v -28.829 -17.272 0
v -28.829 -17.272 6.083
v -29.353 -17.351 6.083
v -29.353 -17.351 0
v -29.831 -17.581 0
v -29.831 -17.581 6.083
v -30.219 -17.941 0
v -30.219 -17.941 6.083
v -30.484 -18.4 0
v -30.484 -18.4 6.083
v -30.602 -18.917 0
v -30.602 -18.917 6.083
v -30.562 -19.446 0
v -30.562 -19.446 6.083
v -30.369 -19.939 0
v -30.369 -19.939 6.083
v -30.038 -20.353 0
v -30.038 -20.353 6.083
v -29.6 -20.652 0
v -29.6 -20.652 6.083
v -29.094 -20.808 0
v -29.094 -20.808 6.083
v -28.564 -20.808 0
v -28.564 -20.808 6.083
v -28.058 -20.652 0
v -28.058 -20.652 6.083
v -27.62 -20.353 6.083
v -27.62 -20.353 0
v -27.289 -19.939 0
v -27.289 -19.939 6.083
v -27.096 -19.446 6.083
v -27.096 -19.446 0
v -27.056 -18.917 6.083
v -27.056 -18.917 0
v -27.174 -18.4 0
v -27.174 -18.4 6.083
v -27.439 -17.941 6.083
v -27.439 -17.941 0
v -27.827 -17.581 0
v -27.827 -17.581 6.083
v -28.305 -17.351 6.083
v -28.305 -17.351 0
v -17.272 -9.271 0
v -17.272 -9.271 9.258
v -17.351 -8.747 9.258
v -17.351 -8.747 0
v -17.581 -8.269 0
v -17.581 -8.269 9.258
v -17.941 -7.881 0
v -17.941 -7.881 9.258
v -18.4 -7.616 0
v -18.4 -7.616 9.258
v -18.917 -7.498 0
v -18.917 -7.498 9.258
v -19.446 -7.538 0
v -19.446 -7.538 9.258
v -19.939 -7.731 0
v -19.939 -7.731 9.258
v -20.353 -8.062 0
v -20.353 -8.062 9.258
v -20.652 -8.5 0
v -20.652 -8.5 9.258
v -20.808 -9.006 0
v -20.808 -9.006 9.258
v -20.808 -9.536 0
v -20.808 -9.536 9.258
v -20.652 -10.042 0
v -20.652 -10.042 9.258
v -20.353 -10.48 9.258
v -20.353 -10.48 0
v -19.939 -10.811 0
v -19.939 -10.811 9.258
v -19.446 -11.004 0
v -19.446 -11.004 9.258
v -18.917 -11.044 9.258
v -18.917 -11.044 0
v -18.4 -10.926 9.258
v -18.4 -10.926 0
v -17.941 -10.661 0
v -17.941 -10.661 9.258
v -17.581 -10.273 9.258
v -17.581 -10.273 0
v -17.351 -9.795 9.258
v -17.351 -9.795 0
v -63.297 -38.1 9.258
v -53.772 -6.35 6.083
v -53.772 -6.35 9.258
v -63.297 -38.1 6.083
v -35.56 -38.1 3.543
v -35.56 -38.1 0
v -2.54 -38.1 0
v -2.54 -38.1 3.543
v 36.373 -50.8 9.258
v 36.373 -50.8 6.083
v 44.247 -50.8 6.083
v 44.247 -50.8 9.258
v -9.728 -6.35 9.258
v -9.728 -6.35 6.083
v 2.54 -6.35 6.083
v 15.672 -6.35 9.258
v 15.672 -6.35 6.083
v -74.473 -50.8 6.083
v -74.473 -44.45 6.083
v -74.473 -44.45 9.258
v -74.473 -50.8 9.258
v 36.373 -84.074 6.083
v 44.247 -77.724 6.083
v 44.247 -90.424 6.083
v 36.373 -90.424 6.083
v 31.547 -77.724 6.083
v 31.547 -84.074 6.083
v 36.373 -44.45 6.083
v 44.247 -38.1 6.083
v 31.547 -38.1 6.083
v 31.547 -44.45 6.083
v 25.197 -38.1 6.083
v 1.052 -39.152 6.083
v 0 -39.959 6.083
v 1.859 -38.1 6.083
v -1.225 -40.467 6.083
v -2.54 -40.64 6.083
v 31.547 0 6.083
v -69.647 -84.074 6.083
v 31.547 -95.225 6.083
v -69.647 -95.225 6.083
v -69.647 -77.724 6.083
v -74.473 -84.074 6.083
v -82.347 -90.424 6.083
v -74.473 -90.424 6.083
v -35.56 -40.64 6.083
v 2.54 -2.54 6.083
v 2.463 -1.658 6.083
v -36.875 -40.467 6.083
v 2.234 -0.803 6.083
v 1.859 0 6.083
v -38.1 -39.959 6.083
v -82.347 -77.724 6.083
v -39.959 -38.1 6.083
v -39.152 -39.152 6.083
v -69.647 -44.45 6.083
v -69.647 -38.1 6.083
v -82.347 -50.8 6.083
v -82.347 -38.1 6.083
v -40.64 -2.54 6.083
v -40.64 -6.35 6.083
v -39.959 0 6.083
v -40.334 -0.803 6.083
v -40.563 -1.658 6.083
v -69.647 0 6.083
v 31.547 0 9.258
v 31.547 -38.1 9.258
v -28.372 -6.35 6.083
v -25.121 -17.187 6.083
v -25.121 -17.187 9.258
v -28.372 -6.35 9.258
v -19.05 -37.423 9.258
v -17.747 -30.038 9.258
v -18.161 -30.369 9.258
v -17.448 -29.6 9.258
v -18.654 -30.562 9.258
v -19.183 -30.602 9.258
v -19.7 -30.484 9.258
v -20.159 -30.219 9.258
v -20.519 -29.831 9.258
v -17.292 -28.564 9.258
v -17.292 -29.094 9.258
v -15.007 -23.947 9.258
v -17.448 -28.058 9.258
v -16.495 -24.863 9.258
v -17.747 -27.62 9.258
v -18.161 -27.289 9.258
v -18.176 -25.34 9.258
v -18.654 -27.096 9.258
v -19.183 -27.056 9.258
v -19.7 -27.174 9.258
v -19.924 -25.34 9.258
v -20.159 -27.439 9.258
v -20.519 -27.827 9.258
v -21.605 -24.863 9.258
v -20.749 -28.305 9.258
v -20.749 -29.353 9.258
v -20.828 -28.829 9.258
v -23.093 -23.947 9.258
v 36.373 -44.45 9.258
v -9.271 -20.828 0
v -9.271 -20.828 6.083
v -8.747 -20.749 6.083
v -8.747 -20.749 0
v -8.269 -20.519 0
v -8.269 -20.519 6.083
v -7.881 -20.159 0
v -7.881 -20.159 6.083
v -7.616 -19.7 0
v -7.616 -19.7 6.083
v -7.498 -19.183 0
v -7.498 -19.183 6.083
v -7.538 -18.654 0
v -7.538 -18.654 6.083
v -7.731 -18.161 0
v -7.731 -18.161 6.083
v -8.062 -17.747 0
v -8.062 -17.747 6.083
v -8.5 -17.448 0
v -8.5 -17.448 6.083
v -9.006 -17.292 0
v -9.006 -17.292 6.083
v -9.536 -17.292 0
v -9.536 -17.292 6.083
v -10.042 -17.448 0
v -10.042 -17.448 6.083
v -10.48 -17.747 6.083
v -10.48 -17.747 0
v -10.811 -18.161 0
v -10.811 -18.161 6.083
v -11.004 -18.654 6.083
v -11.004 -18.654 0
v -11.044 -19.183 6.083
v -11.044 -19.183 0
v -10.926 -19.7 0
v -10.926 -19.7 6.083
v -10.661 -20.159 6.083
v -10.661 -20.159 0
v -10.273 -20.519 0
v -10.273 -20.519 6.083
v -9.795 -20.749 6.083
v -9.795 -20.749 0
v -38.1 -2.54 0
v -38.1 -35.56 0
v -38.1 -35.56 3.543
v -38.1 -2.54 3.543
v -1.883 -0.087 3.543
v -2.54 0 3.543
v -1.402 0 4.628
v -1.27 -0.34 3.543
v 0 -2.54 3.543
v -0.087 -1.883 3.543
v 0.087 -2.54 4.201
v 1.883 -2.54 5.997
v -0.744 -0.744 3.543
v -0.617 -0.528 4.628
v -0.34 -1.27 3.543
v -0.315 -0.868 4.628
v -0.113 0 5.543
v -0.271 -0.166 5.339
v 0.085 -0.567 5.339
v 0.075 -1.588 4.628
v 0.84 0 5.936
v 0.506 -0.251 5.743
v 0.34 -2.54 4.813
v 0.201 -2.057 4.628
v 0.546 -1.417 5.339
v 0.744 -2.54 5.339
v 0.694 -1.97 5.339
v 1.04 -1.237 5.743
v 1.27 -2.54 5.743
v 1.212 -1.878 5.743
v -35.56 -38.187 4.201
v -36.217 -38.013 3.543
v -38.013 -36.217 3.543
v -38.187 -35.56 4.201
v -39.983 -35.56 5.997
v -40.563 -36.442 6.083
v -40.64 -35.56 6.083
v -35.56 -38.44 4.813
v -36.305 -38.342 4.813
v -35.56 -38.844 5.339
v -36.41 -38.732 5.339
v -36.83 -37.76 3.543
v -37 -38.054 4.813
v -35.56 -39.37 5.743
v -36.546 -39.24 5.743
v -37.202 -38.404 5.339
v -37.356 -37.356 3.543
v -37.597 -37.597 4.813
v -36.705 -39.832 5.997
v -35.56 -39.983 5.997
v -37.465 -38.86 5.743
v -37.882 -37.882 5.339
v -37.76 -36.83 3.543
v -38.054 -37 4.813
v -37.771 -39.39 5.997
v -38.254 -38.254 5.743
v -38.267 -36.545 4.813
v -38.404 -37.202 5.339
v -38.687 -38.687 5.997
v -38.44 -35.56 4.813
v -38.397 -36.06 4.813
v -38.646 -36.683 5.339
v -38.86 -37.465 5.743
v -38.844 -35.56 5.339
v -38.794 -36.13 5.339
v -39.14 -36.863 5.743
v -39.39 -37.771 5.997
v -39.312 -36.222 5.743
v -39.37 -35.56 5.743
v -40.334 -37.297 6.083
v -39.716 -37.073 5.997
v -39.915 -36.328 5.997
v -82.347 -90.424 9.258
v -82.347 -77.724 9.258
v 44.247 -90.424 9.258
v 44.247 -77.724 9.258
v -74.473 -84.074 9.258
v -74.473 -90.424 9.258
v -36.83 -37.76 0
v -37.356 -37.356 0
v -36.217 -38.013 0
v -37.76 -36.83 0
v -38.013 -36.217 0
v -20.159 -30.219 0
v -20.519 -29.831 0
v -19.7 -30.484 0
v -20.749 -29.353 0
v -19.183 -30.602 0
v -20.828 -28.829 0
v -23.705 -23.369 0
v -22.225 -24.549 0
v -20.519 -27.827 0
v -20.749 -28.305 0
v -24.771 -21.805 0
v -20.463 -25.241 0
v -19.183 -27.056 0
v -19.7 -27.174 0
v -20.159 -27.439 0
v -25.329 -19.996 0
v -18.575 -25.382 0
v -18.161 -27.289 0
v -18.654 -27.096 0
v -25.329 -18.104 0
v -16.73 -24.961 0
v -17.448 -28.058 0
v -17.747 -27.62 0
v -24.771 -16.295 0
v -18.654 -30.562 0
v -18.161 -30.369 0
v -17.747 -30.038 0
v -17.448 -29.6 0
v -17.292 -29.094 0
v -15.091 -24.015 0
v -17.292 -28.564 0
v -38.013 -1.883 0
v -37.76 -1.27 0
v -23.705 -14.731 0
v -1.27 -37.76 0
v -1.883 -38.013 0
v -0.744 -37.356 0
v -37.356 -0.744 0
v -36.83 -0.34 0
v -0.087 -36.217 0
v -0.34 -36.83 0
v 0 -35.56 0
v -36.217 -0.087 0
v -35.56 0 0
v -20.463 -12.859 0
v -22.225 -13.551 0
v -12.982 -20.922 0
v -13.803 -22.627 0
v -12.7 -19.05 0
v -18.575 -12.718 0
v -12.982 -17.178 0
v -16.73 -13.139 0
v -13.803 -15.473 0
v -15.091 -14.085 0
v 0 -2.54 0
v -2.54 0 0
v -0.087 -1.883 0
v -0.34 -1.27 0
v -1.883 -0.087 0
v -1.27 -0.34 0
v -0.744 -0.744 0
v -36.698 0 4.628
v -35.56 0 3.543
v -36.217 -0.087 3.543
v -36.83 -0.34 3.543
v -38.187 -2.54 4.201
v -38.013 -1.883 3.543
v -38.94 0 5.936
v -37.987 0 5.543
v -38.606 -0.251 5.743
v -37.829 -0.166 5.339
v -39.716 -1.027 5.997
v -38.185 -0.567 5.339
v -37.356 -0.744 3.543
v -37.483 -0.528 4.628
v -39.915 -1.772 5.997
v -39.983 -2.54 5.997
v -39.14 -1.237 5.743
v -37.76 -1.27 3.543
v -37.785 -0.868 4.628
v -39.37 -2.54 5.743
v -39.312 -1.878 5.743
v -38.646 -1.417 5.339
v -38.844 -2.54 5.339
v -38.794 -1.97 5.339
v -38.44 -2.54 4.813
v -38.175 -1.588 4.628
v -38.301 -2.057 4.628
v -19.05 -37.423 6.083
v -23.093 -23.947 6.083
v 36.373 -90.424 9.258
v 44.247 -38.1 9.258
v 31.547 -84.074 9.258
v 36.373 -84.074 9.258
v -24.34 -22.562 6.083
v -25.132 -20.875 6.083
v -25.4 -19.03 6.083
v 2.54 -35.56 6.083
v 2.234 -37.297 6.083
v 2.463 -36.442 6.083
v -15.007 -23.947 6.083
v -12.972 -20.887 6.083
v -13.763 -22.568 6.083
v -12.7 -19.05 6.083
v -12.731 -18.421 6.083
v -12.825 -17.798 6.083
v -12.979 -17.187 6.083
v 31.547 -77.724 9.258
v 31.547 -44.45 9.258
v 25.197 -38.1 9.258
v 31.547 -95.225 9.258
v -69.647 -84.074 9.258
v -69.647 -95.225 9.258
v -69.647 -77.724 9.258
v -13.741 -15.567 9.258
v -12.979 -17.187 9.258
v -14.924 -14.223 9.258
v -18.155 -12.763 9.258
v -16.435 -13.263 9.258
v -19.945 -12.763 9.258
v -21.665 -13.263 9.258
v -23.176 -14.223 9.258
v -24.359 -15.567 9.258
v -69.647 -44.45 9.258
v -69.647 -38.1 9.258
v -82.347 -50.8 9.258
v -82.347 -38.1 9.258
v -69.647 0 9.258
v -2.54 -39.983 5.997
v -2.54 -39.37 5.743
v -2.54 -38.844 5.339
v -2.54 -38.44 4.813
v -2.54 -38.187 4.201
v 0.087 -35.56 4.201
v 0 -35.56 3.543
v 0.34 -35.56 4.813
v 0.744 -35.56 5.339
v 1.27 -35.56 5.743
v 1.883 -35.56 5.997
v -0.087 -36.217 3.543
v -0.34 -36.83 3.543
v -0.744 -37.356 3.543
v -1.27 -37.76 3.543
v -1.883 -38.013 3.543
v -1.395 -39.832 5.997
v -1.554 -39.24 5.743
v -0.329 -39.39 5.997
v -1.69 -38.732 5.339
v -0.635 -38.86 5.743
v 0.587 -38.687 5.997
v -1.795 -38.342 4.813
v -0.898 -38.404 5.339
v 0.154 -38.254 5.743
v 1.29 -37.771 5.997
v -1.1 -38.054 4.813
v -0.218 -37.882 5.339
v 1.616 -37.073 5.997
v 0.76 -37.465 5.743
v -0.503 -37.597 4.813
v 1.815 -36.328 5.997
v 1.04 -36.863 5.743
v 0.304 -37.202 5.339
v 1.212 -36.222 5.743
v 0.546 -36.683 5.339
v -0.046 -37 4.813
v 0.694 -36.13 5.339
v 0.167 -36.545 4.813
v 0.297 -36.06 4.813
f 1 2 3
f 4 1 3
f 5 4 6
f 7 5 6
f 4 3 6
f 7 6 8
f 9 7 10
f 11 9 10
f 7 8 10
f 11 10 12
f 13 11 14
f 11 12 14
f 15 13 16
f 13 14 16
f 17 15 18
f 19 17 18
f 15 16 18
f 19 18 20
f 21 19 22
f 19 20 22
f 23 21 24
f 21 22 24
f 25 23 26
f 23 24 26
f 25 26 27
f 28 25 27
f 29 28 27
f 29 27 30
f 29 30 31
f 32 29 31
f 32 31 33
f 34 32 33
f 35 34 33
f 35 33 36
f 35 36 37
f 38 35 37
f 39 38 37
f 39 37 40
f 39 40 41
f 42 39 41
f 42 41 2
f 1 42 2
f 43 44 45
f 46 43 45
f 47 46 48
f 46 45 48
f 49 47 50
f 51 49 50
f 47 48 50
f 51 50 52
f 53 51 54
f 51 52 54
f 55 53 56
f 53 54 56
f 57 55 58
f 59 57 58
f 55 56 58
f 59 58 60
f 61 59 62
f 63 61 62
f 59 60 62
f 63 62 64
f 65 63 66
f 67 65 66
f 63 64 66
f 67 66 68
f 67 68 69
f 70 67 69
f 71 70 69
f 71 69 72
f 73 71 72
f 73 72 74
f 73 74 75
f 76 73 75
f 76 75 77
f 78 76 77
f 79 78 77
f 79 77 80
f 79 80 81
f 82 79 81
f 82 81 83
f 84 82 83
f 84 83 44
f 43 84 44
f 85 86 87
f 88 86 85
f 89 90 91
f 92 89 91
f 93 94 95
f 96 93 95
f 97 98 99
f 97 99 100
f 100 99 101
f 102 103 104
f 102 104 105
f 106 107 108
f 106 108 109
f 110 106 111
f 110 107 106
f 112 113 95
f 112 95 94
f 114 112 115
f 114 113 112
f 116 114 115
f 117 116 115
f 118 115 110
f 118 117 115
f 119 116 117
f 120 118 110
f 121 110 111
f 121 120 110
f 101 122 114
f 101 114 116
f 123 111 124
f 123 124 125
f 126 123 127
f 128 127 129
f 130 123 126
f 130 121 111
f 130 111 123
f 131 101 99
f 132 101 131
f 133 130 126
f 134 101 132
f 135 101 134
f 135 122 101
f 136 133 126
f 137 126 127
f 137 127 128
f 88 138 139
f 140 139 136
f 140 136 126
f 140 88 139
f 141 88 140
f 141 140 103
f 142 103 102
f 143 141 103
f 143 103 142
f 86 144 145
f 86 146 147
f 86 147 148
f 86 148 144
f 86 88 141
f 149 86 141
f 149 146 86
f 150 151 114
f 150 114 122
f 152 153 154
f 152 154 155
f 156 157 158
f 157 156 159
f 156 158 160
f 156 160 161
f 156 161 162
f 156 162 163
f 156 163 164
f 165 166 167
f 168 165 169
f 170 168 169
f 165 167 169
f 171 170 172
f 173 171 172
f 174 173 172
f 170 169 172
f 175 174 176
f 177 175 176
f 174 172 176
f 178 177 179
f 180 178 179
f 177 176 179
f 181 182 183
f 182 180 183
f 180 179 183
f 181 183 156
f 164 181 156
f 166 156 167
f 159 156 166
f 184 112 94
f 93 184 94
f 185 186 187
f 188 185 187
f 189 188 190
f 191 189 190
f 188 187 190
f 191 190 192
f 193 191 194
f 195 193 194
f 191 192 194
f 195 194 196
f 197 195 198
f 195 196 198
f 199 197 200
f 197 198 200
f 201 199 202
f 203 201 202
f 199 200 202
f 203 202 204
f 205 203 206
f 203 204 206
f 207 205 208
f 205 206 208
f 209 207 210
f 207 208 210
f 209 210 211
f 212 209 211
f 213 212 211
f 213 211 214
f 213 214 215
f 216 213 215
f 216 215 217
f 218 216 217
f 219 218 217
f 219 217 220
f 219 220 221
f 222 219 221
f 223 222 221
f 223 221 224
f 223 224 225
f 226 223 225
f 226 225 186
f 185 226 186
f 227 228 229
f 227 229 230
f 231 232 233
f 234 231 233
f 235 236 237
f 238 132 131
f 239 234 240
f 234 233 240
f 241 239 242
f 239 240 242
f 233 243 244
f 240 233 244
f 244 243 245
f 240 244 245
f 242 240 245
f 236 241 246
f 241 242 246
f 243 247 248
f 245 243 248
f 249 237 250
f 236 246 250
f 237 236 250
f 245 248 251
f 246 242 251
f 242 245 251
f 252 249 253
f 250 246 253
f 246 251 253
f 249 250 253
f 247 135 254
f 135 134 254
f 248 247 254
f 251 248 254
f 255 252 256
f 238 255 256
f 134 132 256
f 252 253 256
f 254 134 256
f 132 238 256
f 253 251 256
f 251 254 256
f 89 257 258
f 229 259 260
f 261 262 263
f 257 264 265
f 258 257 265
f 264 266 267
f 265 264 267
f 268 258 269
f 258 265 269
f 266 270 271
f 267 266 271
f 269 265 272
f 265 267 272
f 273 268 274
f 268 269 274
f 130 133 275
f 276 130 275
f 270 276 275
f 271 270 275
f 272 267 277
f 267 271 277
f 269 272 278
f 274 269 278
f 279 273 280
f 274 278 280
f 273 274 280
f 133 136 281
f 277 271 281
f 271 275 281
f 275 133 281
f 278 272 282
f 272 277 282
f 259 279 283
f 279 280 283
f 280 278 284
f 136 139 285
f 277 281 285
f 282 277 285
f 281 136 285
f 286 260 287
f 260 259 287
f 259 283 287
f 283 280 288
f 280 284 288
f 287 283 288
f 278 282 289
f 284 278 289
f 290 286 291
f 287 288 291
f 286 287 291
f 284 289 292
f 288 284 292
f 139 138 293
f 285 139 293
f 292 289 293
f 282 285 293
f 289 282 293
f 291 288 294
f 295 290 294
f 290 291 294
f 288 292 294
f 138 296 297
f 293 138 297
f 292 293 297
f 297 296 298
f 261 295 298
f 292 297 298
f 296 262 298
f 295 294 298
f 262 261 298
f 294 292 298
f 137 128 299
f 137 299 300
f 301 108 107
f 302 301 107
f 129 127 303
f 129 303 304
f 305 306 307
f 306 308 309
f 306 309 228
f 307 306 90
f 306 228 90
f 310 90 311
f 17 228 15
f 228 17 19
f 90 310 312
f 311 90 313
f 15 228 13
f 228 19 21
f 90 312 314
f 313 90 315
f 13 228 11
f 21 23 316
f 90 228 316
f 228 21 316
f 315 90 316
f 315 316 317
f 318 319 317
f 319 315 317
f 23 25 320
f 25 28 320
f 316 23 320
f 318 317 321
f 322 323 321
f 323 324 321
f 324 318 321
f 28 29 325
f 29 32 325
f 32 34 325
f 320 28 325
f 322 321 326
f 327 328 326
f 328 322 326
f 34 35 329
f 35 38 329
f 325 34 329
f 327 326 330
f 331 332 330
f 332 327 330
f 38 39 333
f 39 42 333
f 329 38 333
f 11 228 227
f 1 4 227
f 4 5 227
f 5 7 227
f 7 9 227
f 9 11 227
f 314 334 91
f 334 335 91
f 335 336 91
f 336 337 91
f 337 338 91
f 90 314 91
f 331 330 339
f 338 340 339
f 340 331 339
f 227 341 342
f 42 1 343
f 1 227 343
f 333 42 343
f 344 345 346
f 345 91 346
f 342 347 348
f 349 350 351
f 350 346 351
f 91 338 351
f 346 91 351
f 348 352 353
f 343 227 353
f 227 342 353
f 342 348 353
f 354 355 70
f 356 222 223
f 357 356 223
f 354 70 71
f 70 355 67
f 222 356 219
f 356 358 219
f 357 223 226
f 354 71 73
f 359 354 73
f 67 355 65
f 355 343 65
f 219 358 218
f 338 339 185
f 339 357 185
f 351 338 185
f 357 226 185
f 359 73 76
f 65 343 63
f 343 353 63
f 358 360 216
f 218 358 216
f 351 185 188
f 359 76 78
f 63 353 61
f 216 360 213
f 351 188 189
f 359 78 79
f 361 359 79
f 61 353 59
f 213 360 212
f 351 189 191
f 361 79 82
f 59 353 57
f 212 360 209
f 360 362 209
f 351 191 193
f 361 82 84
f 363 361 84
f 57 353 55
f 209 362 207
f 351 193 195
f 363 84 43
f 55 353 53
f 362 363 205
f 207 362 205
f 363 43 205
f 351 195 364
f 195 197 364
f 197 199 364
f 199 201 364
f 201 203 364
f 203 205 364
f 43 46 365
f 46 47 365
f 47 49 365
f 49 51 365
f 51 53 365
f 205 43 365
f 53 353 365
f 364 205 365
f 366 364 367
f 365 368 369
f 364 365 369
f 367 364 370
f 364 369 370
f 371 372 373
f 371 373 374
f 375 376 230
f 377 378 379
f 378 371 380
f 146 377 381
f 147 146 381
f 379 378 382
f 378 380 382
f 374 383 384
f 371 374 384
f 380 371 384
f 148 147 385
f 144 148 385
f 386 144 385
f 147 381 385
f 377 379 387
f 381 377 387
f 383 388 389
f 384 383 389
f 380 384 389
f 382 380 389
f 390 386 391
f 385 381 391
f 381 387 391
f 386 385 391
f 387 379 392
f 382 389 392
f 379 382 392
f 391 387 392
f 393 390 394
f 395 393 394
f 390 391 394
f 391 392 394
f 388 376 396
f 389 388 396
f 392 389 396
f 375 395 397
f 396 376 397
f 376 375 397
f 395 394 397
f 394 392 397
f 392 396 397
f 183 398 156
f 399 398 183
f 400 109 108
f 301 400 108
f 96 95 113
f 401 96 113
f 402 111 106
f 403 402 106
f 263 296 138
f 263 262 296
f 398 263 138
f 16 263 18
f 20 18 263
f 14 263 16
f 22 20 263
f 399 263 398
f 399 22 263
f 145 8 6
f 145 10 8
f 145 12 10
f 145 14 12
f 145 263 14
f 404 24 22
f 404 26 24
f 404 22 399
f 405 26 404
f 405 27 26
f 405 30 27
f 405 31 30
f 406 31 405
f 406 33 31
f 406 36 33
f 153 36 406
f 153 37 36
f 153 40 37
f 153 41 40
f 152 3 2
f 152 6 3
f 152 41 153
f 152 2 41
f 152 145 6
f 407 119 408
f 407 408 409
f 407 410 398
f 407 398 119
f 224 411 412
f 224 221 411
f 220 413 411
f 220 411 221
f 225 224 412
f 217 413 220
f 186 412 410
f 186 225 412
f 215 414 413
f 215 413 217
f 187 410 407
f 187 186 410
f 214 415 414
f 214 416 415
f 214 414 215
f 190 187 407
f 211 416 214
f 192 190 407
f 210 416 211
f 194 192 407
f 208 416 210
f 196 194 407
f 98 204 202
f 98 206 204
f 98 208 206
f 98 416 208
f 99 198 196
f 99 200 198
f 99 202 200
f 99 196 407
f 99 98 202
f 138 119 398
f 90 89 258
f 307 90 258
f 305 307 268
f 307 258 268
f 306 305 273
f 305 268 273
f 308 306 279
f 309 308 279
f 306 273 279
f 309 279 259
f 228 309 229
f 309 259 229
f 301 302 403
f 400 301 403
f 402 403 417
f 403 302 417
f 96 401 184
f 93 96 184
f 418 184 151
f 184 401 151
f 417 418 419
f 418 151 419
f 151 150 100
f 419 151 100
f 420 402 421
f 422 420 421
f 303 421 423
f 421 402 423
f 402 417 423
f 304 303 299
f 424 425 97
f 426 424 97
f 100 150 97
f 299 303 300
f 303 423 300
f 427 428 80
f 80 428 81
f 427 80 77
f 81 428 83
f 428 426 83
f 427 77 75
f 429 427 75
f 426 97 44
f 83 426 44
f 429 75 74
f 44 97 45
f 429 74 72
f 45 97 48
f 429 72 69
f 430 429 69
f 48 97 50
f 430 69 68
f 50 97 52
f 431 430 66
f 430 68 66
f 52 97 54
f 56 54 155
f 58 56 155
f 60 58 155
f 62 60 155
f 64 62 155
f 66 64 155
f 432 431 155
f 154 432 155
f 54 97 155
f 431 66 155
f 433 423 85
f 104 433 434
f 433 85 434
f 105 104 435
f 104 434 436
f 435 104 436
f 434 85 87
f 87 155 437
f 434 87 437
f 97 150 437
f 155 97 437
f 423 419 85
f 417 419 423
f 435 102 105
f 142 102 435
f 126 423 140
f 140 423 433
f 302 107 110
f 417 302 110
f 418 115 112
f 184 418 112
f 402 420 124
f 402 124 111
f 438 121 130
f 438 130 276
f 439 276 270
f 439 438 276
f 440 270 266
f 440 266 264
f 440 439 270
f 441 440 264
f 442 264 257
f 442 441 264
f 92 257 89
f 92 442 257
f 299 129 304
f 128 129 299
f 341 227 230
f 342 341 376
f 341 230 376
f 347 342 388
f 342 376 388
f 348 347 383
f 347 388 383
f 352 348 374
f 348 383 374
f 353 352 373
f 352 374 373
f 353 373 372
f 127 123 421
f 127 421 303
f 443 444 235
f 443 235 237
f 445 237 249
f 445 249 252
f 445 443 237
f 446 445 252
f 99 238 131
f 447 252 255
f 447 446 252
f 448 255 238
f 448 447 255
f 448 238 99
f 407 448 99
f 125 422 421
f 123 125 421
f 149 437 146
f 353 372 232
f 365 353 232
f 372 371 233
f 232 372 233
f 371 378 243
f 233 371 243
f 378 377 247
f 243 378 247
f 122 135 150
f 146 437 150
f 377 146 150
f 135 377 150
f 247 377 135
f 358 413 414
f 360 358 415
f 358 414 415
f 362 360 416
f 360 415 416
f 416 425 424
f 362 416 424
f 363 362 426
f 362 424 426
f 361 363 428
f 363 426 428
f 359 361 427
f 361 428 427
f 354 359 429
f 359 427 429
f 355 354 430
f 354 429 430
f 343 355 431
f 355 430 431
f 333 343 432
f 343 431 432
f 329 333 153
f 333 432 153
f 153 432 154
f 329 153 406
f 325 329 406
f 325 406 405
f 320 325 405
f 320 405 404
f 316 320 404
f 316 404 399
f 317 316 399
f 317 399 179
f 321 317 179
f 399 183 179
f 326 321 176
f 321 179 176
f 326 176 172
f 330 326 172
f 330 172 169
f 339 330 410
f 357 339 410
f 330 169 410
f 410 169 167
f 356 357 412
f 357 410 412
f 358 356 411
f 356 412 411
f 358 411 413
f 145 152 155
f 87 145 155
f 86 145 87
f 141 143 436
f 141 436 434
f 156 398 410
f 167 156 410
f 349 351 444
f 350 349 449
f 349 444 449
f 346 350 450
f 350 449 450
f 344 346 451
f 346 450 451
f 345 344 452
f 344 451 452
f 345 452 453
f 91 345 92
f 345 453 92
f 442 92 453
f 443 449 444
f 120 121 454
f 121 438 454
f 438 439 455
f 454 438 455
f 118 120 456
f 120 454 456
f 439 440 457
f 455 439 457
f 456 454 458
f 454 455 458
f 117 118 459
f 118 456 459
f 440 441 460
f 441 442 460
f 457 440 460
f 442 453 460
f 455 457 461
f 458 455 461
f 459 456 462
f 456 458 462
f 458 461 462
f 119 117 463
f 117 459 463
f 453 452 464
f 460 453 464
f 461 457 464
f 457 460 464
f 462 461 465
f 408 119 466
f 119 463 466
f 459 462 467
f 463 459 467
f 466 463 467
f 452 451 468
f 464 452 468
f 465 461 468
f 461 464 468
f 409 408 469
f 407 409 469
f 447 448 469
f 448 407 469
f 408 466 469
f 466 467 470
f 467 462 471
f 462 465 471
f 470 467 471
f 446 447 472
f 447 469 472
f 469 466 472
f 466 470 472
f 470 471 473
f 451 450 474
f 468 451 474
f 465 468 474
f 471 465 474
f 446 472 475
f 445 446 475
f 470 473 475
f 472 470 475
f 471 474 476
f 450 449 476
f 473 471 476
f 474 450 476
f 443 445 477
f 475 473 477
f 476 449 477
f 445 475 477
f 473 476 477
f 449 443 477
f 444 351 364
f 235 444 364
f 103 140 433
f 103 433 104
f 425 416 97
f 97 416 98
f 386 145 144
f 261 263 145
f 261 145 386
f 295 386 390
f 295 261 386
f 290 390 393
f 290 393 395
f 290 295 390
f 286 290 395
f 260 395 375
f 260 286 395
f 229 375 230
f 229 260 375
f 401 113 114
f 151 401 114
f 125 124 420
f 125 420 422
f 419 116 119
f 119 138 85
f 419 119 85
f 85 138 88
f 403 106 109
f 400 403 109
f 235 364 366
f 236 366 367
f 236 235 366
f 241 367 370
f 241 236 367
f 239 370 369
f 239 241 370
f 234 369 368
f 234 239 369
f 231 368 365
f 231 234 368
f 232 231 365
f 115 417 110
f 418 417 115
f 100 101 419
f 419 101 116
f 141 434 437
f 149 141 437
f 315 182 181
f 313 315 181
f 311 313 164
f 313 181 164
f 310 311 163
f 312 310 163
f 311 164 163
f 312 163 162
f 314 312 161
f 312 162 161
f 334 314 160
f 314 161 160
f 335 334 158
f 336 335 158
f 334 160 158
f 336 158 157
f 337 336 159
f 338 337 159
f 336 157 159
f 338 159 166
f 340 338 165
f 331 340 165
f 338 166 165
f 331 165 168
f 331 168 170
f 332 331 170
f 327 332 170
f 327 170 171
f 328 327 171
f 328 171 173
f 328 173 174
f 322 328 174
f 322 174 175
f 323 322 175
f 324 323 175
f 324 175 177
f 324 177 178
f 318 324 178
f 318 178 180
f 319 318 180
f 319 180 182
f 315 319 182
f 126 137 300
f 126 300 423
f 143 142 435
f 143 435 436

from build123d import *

# Parameters (mm, degrees)
SKETCH1_W           = 38.1
SKETCH1_H           = 38.1
BOSS_EXTRUDE1_DEPTH = 9.2583
SKETCH2_R           = 6.35
CUT_EXTRUDE1_DEPTH  = 10.8458
SKETCH3_R           = 1.778
CUT_EXTRUDE2_DEPTH  = 10.8458
CIRPATTERN1_COUNT   = 4
SKETCH4_W           = 31.5468
SKETCH4_H           = 95.2246
BOSS_EXTRUDE2_DEPTH = 3.175
SKETCH5_W           = 38.1
SKETCH5_H           = 57.1246
BOSS_EXTRUDE3_DEPTH = 3.175
FILLET1_R           = 2.54
FILLET2_R           = 2.54
BOSS_EXTRUDE4_DEPTH = 3.175
CUT_EXTRUDE3_DEPTH  = 4.7625


with BuildPart() as part:
    # Sketch1 → Boss-Extrude1 (new body)
    with BuildSketch(Plane.XY):
        with Locations((-19.05, -19.05)):
            Rectangle(SKETCH1_W, SKETCH1_H)
    extrude(amount=BOSS_EXTRUDE1_DEPTH)

    # Sketch2 → Cut-Extrude1 (cut)
    with BuildSketch(Plane.XY.offset(9.2583)):
        with Locations((-19.05, -19.05)):
            Circle(SKETCH2_R)
    extrude(amount=-CUT_EXTRUDE1_DEPTH, mode=Mode.SUBTRACT)

    # Sketch3 → Cut-Extrude2 (cut)
    with BuildSketch(Plane.XY.offset(9.2583)):
        with Locations((-19.05, -9.271)):
            Circle(SKETCH3_R)
    cut_extrude2 = extrude(amount=-CUT_EXTRUDE2_DEPTH, mode=Mode.SUBTRACT)

    # CirPattern1: Cut-Extrude2 ×4 about axis
    cirpattern1_axis = Axis((-19.05, -19.05, 0), (0, 0, 1))
    for i in range(1, CIRPATTERN1_COUNT):
        add(cut_extrude2.rotate(cirpattern1_axis, i * 360 / CIRPATTERN1_COUNT), mode=Mode.SUBTRACT)

    # Sketch4 → Boss-Extrude2 (add)
    with BuildSketch(Plane.XY.offset(9.2583)):
        with Locations((-53.8734, -47.6123)):
            Rectangle(SKETCH4_W, SKETCH4_H)
        with Locations((15.7734, -47.6123)):
            Rectangle(SKETCH4_W, SKETCH4_H)
    extrude(amount=-BOSS_EXTRUDE2_DEPTH)

    # Sketch5 → Boss-Extrude3 (add)
    with BuildSketch(Plane(origin=(0, 0, 6.0833), x_dir=(-1, 0, 0), z_dir=(0, 0, -1))):
        with Locations((19.05, -66.6623)):
            Rectangle(SKETCH5_W, SKETCH5_H)
    extrude(amount=-BOSS_EXTRUDE3_DEPTH)

    # Fillet1
    fillet1_edges = [part.edges().sort_by_distance(p)[0] for p in [
        (-38.1, -38.1, 3.04165),
        (-38.1, 0, 3.04165),
        (0, 0, 3.04165),
        (0, -38.1, 3.04165),
    ]]
    fillet(fillet1_edges, radius=FILLET1_R)

    # Fillet2
    # the kernel refuses this fillet: 2.54 mm, written as the material it adds along each edge
    with BuildSketch(Plane(origin=(-38.1, -35.56, 6.0833), x_dir=(0, 0, -1), z_dir=(0, 1, 0)), Plane(origin=(-2.54, -38.1, 6.0833), x_dir=(0, 0, -1), z_dir=(-1, 0, 0))) as fillet2_piece_1:
        with BuildLine():
            CenterArc((FILLET2_R, FILLET2_R), FILLET2_R, 180, 90)
            Line((0, FILLET2_R), (0, 0))
            Line((0, 0), (FILLET2_R, 0))
        make_face()
    extrude(amount=33.02)
    with BuildSketch(Plane(origin=(0, -35.56, 6.0833), x_dir=(0, 0, -1), z_dir=(0, 1, 0))) as fillet2_piece_2:
        with BuildLine():
            CenterArc((FILLET2_R, -FILLET2_R), FILLET2_R, 90, 90)
            Line((0, -FILLET2_R), (0, 0))
            Line((0, 0), (FILLET2_R, 0))
        make_face()
    extrude(amount=33.02)
    with BuildSketch(Plane(origin=(-35.56, -2.54, 6.0833), x_dir=(0.5976672776328278, -0.8017442392976482, 0), z_dir=(-0.8017442392976482, -0.5976672776328278, 0))) as fillet2_piece_3_section:
        with BuildLine():
            CenterArc((2.54 + FILLET2_R, -FILLET2_R), FILLET2_R, 90, 90)
            Line((2.54 + FILLET2_R, 0), (2.54, 0))
            Line((2.54, 0), (2.54, -FILLET2_R))
        make_face()
    fillet2_piece_3 = revolve(axis=Axis((-35.56, -2.54, 6.0833), (0, 0, 1)), revolution_arc=233.296989237, mode=Mode.PRIVATE)
    fillet2_piece_3 = split(fillet2_piece_3, bisect_by=Plane(origin=(-37.464844957, 0, 5.291764105), z_dir=(0, -1, 0)), keep=Keep.TOP, mode=Mode.PRIVATE)
    add(fillet2_piece_3)
    with BuildSketch(Plane(origin=(-35.56, -35.56, 6.0833), x_dir=(0, -1, 0), z_dir=(1, 0, 0))) as fillet2_piece_4:
        with BuildLine():
            CenterArc((2.54 + FILLET2_R, FILLET2_R), FILLET2_R, 180, 90)
            Line((2.54 + FILLET2_R, 0), (2.54, 0))
            Line((2.54, 0), (2.54, FILLET2_R))
        make_face()
    revolve(axis=Axis((-35.56, -35.56, 6.0833), (0, 0, -1)), revolution_arc=90)
    with BuildSketch(Plane(origin=(-2.54, -35.56, 6.0833), x_dir=(0, -1, 0), z_dir=(-1, 0, 0))) as fillet2_piece_5:
        with BuildLine():
            CenterArc((2.54 + FILLET2_R, -FILLET2_R), FILLET2_R, 90, 90)
            Line((2.54 + FILLET2_R, 0), (2.54, 0))
            Line((2.54, 0), (2.54, -FILLET2_R))
        make_face()
    revolve(axis=Axis((-2.54, -35.56, 6.0833), (0, 0, 1)), revolution_arc=90)
    with BuildSketch(Plane(origin=(-2.54, -2.54, 6.0833), x_dir=(-0.5976672776328275, -0.8017442392976483, 0), z_dir=(0.8017442392976483, -0.5976672776328275, 0))) as fillet2_piece_6_section:
        with BuildLine():
            CenterArc((2.54 + FILLET2_R, FILLET2_R), FILLET2_R, 180, 90)
            Line((2.54, FILLET2_R), (2.54, 0))
            Line((2.54, 0), (2.54 + FILLET2_R, 0))
        make_face()
    fillet2_piece_6 = revolve(axis=Axis((-2.54, -2.54, 6.0833), (0, 0, -1)), revolution_arc=233.296989237, mode=Mode.PRIVATE)
    fillet2_piece_6 = split(fillet2_piece_6, bisect_by=Plane(origin=(-0.63515521, 0, 5.291763812), z_dir=(0, -1, 0)), keep=Keep.TOP, mode=Mode.PRIVATE)
    add(fillet2_piece_6)

    # Sketch6 → Boss-Extrude4 (add)
    with BuildSketch(Plane(origin=(0, 0, 6.0833), x_dir=(-1, 0, 0), z_dir=(0, 0, -1))):
        Polygon((-36.3728, -50.8), (-44.2468, -50.8), (-44.2468, -38.1), (-31.5468, -38.1), (-31.5468, -44.45), (-36.3728, -44.45), align=None)
        Polygon((-36.3728, -90.424), (-44.2468, -90.424), (-44.2468, -77.724), (-31.5468, -77.724), (-31.5468, -84.074), (-36.3728, -84.074), align=None)
    boss_extrude4 = extrude(amount=-BOSS_EXTRUDE4_DEPTH)

    # Mirror2: Boss-Extrude4 across plane
    add(boss_extrude4.mirror(Plane(origin=(-19.05, 0, 0), x_dir=(0, 0, 1), z_dir=(1, 0, 0))))

    # Sketch8 → Cut-Extrude3 (cut)
    with BuildSketch(Plane(origin=(0, 0, 6.0833), x_dir=(-1, 0, 0), z_dir=(0, 0, -1))):
        Polygon((-25.1968, -38.1), (19.2532, -38.1), (9.7282, -6.35), (-15.6718, -6.35), align=None)
    cut_extrude3 = extrude(amount=-CUT_EXTRUDE3_DEPTH, mode=Mode.SUBTRACT)

    # Mirror3: Cut-Extrude3 across plane
    add(cut_extrude3.mirror(Plane(origin=(-19.05, 0, 0), x_dir=(0, 0, 1), z_dir=(1, 0, 0))), mode=Mode.SUBTRACT)


solid = part.part
